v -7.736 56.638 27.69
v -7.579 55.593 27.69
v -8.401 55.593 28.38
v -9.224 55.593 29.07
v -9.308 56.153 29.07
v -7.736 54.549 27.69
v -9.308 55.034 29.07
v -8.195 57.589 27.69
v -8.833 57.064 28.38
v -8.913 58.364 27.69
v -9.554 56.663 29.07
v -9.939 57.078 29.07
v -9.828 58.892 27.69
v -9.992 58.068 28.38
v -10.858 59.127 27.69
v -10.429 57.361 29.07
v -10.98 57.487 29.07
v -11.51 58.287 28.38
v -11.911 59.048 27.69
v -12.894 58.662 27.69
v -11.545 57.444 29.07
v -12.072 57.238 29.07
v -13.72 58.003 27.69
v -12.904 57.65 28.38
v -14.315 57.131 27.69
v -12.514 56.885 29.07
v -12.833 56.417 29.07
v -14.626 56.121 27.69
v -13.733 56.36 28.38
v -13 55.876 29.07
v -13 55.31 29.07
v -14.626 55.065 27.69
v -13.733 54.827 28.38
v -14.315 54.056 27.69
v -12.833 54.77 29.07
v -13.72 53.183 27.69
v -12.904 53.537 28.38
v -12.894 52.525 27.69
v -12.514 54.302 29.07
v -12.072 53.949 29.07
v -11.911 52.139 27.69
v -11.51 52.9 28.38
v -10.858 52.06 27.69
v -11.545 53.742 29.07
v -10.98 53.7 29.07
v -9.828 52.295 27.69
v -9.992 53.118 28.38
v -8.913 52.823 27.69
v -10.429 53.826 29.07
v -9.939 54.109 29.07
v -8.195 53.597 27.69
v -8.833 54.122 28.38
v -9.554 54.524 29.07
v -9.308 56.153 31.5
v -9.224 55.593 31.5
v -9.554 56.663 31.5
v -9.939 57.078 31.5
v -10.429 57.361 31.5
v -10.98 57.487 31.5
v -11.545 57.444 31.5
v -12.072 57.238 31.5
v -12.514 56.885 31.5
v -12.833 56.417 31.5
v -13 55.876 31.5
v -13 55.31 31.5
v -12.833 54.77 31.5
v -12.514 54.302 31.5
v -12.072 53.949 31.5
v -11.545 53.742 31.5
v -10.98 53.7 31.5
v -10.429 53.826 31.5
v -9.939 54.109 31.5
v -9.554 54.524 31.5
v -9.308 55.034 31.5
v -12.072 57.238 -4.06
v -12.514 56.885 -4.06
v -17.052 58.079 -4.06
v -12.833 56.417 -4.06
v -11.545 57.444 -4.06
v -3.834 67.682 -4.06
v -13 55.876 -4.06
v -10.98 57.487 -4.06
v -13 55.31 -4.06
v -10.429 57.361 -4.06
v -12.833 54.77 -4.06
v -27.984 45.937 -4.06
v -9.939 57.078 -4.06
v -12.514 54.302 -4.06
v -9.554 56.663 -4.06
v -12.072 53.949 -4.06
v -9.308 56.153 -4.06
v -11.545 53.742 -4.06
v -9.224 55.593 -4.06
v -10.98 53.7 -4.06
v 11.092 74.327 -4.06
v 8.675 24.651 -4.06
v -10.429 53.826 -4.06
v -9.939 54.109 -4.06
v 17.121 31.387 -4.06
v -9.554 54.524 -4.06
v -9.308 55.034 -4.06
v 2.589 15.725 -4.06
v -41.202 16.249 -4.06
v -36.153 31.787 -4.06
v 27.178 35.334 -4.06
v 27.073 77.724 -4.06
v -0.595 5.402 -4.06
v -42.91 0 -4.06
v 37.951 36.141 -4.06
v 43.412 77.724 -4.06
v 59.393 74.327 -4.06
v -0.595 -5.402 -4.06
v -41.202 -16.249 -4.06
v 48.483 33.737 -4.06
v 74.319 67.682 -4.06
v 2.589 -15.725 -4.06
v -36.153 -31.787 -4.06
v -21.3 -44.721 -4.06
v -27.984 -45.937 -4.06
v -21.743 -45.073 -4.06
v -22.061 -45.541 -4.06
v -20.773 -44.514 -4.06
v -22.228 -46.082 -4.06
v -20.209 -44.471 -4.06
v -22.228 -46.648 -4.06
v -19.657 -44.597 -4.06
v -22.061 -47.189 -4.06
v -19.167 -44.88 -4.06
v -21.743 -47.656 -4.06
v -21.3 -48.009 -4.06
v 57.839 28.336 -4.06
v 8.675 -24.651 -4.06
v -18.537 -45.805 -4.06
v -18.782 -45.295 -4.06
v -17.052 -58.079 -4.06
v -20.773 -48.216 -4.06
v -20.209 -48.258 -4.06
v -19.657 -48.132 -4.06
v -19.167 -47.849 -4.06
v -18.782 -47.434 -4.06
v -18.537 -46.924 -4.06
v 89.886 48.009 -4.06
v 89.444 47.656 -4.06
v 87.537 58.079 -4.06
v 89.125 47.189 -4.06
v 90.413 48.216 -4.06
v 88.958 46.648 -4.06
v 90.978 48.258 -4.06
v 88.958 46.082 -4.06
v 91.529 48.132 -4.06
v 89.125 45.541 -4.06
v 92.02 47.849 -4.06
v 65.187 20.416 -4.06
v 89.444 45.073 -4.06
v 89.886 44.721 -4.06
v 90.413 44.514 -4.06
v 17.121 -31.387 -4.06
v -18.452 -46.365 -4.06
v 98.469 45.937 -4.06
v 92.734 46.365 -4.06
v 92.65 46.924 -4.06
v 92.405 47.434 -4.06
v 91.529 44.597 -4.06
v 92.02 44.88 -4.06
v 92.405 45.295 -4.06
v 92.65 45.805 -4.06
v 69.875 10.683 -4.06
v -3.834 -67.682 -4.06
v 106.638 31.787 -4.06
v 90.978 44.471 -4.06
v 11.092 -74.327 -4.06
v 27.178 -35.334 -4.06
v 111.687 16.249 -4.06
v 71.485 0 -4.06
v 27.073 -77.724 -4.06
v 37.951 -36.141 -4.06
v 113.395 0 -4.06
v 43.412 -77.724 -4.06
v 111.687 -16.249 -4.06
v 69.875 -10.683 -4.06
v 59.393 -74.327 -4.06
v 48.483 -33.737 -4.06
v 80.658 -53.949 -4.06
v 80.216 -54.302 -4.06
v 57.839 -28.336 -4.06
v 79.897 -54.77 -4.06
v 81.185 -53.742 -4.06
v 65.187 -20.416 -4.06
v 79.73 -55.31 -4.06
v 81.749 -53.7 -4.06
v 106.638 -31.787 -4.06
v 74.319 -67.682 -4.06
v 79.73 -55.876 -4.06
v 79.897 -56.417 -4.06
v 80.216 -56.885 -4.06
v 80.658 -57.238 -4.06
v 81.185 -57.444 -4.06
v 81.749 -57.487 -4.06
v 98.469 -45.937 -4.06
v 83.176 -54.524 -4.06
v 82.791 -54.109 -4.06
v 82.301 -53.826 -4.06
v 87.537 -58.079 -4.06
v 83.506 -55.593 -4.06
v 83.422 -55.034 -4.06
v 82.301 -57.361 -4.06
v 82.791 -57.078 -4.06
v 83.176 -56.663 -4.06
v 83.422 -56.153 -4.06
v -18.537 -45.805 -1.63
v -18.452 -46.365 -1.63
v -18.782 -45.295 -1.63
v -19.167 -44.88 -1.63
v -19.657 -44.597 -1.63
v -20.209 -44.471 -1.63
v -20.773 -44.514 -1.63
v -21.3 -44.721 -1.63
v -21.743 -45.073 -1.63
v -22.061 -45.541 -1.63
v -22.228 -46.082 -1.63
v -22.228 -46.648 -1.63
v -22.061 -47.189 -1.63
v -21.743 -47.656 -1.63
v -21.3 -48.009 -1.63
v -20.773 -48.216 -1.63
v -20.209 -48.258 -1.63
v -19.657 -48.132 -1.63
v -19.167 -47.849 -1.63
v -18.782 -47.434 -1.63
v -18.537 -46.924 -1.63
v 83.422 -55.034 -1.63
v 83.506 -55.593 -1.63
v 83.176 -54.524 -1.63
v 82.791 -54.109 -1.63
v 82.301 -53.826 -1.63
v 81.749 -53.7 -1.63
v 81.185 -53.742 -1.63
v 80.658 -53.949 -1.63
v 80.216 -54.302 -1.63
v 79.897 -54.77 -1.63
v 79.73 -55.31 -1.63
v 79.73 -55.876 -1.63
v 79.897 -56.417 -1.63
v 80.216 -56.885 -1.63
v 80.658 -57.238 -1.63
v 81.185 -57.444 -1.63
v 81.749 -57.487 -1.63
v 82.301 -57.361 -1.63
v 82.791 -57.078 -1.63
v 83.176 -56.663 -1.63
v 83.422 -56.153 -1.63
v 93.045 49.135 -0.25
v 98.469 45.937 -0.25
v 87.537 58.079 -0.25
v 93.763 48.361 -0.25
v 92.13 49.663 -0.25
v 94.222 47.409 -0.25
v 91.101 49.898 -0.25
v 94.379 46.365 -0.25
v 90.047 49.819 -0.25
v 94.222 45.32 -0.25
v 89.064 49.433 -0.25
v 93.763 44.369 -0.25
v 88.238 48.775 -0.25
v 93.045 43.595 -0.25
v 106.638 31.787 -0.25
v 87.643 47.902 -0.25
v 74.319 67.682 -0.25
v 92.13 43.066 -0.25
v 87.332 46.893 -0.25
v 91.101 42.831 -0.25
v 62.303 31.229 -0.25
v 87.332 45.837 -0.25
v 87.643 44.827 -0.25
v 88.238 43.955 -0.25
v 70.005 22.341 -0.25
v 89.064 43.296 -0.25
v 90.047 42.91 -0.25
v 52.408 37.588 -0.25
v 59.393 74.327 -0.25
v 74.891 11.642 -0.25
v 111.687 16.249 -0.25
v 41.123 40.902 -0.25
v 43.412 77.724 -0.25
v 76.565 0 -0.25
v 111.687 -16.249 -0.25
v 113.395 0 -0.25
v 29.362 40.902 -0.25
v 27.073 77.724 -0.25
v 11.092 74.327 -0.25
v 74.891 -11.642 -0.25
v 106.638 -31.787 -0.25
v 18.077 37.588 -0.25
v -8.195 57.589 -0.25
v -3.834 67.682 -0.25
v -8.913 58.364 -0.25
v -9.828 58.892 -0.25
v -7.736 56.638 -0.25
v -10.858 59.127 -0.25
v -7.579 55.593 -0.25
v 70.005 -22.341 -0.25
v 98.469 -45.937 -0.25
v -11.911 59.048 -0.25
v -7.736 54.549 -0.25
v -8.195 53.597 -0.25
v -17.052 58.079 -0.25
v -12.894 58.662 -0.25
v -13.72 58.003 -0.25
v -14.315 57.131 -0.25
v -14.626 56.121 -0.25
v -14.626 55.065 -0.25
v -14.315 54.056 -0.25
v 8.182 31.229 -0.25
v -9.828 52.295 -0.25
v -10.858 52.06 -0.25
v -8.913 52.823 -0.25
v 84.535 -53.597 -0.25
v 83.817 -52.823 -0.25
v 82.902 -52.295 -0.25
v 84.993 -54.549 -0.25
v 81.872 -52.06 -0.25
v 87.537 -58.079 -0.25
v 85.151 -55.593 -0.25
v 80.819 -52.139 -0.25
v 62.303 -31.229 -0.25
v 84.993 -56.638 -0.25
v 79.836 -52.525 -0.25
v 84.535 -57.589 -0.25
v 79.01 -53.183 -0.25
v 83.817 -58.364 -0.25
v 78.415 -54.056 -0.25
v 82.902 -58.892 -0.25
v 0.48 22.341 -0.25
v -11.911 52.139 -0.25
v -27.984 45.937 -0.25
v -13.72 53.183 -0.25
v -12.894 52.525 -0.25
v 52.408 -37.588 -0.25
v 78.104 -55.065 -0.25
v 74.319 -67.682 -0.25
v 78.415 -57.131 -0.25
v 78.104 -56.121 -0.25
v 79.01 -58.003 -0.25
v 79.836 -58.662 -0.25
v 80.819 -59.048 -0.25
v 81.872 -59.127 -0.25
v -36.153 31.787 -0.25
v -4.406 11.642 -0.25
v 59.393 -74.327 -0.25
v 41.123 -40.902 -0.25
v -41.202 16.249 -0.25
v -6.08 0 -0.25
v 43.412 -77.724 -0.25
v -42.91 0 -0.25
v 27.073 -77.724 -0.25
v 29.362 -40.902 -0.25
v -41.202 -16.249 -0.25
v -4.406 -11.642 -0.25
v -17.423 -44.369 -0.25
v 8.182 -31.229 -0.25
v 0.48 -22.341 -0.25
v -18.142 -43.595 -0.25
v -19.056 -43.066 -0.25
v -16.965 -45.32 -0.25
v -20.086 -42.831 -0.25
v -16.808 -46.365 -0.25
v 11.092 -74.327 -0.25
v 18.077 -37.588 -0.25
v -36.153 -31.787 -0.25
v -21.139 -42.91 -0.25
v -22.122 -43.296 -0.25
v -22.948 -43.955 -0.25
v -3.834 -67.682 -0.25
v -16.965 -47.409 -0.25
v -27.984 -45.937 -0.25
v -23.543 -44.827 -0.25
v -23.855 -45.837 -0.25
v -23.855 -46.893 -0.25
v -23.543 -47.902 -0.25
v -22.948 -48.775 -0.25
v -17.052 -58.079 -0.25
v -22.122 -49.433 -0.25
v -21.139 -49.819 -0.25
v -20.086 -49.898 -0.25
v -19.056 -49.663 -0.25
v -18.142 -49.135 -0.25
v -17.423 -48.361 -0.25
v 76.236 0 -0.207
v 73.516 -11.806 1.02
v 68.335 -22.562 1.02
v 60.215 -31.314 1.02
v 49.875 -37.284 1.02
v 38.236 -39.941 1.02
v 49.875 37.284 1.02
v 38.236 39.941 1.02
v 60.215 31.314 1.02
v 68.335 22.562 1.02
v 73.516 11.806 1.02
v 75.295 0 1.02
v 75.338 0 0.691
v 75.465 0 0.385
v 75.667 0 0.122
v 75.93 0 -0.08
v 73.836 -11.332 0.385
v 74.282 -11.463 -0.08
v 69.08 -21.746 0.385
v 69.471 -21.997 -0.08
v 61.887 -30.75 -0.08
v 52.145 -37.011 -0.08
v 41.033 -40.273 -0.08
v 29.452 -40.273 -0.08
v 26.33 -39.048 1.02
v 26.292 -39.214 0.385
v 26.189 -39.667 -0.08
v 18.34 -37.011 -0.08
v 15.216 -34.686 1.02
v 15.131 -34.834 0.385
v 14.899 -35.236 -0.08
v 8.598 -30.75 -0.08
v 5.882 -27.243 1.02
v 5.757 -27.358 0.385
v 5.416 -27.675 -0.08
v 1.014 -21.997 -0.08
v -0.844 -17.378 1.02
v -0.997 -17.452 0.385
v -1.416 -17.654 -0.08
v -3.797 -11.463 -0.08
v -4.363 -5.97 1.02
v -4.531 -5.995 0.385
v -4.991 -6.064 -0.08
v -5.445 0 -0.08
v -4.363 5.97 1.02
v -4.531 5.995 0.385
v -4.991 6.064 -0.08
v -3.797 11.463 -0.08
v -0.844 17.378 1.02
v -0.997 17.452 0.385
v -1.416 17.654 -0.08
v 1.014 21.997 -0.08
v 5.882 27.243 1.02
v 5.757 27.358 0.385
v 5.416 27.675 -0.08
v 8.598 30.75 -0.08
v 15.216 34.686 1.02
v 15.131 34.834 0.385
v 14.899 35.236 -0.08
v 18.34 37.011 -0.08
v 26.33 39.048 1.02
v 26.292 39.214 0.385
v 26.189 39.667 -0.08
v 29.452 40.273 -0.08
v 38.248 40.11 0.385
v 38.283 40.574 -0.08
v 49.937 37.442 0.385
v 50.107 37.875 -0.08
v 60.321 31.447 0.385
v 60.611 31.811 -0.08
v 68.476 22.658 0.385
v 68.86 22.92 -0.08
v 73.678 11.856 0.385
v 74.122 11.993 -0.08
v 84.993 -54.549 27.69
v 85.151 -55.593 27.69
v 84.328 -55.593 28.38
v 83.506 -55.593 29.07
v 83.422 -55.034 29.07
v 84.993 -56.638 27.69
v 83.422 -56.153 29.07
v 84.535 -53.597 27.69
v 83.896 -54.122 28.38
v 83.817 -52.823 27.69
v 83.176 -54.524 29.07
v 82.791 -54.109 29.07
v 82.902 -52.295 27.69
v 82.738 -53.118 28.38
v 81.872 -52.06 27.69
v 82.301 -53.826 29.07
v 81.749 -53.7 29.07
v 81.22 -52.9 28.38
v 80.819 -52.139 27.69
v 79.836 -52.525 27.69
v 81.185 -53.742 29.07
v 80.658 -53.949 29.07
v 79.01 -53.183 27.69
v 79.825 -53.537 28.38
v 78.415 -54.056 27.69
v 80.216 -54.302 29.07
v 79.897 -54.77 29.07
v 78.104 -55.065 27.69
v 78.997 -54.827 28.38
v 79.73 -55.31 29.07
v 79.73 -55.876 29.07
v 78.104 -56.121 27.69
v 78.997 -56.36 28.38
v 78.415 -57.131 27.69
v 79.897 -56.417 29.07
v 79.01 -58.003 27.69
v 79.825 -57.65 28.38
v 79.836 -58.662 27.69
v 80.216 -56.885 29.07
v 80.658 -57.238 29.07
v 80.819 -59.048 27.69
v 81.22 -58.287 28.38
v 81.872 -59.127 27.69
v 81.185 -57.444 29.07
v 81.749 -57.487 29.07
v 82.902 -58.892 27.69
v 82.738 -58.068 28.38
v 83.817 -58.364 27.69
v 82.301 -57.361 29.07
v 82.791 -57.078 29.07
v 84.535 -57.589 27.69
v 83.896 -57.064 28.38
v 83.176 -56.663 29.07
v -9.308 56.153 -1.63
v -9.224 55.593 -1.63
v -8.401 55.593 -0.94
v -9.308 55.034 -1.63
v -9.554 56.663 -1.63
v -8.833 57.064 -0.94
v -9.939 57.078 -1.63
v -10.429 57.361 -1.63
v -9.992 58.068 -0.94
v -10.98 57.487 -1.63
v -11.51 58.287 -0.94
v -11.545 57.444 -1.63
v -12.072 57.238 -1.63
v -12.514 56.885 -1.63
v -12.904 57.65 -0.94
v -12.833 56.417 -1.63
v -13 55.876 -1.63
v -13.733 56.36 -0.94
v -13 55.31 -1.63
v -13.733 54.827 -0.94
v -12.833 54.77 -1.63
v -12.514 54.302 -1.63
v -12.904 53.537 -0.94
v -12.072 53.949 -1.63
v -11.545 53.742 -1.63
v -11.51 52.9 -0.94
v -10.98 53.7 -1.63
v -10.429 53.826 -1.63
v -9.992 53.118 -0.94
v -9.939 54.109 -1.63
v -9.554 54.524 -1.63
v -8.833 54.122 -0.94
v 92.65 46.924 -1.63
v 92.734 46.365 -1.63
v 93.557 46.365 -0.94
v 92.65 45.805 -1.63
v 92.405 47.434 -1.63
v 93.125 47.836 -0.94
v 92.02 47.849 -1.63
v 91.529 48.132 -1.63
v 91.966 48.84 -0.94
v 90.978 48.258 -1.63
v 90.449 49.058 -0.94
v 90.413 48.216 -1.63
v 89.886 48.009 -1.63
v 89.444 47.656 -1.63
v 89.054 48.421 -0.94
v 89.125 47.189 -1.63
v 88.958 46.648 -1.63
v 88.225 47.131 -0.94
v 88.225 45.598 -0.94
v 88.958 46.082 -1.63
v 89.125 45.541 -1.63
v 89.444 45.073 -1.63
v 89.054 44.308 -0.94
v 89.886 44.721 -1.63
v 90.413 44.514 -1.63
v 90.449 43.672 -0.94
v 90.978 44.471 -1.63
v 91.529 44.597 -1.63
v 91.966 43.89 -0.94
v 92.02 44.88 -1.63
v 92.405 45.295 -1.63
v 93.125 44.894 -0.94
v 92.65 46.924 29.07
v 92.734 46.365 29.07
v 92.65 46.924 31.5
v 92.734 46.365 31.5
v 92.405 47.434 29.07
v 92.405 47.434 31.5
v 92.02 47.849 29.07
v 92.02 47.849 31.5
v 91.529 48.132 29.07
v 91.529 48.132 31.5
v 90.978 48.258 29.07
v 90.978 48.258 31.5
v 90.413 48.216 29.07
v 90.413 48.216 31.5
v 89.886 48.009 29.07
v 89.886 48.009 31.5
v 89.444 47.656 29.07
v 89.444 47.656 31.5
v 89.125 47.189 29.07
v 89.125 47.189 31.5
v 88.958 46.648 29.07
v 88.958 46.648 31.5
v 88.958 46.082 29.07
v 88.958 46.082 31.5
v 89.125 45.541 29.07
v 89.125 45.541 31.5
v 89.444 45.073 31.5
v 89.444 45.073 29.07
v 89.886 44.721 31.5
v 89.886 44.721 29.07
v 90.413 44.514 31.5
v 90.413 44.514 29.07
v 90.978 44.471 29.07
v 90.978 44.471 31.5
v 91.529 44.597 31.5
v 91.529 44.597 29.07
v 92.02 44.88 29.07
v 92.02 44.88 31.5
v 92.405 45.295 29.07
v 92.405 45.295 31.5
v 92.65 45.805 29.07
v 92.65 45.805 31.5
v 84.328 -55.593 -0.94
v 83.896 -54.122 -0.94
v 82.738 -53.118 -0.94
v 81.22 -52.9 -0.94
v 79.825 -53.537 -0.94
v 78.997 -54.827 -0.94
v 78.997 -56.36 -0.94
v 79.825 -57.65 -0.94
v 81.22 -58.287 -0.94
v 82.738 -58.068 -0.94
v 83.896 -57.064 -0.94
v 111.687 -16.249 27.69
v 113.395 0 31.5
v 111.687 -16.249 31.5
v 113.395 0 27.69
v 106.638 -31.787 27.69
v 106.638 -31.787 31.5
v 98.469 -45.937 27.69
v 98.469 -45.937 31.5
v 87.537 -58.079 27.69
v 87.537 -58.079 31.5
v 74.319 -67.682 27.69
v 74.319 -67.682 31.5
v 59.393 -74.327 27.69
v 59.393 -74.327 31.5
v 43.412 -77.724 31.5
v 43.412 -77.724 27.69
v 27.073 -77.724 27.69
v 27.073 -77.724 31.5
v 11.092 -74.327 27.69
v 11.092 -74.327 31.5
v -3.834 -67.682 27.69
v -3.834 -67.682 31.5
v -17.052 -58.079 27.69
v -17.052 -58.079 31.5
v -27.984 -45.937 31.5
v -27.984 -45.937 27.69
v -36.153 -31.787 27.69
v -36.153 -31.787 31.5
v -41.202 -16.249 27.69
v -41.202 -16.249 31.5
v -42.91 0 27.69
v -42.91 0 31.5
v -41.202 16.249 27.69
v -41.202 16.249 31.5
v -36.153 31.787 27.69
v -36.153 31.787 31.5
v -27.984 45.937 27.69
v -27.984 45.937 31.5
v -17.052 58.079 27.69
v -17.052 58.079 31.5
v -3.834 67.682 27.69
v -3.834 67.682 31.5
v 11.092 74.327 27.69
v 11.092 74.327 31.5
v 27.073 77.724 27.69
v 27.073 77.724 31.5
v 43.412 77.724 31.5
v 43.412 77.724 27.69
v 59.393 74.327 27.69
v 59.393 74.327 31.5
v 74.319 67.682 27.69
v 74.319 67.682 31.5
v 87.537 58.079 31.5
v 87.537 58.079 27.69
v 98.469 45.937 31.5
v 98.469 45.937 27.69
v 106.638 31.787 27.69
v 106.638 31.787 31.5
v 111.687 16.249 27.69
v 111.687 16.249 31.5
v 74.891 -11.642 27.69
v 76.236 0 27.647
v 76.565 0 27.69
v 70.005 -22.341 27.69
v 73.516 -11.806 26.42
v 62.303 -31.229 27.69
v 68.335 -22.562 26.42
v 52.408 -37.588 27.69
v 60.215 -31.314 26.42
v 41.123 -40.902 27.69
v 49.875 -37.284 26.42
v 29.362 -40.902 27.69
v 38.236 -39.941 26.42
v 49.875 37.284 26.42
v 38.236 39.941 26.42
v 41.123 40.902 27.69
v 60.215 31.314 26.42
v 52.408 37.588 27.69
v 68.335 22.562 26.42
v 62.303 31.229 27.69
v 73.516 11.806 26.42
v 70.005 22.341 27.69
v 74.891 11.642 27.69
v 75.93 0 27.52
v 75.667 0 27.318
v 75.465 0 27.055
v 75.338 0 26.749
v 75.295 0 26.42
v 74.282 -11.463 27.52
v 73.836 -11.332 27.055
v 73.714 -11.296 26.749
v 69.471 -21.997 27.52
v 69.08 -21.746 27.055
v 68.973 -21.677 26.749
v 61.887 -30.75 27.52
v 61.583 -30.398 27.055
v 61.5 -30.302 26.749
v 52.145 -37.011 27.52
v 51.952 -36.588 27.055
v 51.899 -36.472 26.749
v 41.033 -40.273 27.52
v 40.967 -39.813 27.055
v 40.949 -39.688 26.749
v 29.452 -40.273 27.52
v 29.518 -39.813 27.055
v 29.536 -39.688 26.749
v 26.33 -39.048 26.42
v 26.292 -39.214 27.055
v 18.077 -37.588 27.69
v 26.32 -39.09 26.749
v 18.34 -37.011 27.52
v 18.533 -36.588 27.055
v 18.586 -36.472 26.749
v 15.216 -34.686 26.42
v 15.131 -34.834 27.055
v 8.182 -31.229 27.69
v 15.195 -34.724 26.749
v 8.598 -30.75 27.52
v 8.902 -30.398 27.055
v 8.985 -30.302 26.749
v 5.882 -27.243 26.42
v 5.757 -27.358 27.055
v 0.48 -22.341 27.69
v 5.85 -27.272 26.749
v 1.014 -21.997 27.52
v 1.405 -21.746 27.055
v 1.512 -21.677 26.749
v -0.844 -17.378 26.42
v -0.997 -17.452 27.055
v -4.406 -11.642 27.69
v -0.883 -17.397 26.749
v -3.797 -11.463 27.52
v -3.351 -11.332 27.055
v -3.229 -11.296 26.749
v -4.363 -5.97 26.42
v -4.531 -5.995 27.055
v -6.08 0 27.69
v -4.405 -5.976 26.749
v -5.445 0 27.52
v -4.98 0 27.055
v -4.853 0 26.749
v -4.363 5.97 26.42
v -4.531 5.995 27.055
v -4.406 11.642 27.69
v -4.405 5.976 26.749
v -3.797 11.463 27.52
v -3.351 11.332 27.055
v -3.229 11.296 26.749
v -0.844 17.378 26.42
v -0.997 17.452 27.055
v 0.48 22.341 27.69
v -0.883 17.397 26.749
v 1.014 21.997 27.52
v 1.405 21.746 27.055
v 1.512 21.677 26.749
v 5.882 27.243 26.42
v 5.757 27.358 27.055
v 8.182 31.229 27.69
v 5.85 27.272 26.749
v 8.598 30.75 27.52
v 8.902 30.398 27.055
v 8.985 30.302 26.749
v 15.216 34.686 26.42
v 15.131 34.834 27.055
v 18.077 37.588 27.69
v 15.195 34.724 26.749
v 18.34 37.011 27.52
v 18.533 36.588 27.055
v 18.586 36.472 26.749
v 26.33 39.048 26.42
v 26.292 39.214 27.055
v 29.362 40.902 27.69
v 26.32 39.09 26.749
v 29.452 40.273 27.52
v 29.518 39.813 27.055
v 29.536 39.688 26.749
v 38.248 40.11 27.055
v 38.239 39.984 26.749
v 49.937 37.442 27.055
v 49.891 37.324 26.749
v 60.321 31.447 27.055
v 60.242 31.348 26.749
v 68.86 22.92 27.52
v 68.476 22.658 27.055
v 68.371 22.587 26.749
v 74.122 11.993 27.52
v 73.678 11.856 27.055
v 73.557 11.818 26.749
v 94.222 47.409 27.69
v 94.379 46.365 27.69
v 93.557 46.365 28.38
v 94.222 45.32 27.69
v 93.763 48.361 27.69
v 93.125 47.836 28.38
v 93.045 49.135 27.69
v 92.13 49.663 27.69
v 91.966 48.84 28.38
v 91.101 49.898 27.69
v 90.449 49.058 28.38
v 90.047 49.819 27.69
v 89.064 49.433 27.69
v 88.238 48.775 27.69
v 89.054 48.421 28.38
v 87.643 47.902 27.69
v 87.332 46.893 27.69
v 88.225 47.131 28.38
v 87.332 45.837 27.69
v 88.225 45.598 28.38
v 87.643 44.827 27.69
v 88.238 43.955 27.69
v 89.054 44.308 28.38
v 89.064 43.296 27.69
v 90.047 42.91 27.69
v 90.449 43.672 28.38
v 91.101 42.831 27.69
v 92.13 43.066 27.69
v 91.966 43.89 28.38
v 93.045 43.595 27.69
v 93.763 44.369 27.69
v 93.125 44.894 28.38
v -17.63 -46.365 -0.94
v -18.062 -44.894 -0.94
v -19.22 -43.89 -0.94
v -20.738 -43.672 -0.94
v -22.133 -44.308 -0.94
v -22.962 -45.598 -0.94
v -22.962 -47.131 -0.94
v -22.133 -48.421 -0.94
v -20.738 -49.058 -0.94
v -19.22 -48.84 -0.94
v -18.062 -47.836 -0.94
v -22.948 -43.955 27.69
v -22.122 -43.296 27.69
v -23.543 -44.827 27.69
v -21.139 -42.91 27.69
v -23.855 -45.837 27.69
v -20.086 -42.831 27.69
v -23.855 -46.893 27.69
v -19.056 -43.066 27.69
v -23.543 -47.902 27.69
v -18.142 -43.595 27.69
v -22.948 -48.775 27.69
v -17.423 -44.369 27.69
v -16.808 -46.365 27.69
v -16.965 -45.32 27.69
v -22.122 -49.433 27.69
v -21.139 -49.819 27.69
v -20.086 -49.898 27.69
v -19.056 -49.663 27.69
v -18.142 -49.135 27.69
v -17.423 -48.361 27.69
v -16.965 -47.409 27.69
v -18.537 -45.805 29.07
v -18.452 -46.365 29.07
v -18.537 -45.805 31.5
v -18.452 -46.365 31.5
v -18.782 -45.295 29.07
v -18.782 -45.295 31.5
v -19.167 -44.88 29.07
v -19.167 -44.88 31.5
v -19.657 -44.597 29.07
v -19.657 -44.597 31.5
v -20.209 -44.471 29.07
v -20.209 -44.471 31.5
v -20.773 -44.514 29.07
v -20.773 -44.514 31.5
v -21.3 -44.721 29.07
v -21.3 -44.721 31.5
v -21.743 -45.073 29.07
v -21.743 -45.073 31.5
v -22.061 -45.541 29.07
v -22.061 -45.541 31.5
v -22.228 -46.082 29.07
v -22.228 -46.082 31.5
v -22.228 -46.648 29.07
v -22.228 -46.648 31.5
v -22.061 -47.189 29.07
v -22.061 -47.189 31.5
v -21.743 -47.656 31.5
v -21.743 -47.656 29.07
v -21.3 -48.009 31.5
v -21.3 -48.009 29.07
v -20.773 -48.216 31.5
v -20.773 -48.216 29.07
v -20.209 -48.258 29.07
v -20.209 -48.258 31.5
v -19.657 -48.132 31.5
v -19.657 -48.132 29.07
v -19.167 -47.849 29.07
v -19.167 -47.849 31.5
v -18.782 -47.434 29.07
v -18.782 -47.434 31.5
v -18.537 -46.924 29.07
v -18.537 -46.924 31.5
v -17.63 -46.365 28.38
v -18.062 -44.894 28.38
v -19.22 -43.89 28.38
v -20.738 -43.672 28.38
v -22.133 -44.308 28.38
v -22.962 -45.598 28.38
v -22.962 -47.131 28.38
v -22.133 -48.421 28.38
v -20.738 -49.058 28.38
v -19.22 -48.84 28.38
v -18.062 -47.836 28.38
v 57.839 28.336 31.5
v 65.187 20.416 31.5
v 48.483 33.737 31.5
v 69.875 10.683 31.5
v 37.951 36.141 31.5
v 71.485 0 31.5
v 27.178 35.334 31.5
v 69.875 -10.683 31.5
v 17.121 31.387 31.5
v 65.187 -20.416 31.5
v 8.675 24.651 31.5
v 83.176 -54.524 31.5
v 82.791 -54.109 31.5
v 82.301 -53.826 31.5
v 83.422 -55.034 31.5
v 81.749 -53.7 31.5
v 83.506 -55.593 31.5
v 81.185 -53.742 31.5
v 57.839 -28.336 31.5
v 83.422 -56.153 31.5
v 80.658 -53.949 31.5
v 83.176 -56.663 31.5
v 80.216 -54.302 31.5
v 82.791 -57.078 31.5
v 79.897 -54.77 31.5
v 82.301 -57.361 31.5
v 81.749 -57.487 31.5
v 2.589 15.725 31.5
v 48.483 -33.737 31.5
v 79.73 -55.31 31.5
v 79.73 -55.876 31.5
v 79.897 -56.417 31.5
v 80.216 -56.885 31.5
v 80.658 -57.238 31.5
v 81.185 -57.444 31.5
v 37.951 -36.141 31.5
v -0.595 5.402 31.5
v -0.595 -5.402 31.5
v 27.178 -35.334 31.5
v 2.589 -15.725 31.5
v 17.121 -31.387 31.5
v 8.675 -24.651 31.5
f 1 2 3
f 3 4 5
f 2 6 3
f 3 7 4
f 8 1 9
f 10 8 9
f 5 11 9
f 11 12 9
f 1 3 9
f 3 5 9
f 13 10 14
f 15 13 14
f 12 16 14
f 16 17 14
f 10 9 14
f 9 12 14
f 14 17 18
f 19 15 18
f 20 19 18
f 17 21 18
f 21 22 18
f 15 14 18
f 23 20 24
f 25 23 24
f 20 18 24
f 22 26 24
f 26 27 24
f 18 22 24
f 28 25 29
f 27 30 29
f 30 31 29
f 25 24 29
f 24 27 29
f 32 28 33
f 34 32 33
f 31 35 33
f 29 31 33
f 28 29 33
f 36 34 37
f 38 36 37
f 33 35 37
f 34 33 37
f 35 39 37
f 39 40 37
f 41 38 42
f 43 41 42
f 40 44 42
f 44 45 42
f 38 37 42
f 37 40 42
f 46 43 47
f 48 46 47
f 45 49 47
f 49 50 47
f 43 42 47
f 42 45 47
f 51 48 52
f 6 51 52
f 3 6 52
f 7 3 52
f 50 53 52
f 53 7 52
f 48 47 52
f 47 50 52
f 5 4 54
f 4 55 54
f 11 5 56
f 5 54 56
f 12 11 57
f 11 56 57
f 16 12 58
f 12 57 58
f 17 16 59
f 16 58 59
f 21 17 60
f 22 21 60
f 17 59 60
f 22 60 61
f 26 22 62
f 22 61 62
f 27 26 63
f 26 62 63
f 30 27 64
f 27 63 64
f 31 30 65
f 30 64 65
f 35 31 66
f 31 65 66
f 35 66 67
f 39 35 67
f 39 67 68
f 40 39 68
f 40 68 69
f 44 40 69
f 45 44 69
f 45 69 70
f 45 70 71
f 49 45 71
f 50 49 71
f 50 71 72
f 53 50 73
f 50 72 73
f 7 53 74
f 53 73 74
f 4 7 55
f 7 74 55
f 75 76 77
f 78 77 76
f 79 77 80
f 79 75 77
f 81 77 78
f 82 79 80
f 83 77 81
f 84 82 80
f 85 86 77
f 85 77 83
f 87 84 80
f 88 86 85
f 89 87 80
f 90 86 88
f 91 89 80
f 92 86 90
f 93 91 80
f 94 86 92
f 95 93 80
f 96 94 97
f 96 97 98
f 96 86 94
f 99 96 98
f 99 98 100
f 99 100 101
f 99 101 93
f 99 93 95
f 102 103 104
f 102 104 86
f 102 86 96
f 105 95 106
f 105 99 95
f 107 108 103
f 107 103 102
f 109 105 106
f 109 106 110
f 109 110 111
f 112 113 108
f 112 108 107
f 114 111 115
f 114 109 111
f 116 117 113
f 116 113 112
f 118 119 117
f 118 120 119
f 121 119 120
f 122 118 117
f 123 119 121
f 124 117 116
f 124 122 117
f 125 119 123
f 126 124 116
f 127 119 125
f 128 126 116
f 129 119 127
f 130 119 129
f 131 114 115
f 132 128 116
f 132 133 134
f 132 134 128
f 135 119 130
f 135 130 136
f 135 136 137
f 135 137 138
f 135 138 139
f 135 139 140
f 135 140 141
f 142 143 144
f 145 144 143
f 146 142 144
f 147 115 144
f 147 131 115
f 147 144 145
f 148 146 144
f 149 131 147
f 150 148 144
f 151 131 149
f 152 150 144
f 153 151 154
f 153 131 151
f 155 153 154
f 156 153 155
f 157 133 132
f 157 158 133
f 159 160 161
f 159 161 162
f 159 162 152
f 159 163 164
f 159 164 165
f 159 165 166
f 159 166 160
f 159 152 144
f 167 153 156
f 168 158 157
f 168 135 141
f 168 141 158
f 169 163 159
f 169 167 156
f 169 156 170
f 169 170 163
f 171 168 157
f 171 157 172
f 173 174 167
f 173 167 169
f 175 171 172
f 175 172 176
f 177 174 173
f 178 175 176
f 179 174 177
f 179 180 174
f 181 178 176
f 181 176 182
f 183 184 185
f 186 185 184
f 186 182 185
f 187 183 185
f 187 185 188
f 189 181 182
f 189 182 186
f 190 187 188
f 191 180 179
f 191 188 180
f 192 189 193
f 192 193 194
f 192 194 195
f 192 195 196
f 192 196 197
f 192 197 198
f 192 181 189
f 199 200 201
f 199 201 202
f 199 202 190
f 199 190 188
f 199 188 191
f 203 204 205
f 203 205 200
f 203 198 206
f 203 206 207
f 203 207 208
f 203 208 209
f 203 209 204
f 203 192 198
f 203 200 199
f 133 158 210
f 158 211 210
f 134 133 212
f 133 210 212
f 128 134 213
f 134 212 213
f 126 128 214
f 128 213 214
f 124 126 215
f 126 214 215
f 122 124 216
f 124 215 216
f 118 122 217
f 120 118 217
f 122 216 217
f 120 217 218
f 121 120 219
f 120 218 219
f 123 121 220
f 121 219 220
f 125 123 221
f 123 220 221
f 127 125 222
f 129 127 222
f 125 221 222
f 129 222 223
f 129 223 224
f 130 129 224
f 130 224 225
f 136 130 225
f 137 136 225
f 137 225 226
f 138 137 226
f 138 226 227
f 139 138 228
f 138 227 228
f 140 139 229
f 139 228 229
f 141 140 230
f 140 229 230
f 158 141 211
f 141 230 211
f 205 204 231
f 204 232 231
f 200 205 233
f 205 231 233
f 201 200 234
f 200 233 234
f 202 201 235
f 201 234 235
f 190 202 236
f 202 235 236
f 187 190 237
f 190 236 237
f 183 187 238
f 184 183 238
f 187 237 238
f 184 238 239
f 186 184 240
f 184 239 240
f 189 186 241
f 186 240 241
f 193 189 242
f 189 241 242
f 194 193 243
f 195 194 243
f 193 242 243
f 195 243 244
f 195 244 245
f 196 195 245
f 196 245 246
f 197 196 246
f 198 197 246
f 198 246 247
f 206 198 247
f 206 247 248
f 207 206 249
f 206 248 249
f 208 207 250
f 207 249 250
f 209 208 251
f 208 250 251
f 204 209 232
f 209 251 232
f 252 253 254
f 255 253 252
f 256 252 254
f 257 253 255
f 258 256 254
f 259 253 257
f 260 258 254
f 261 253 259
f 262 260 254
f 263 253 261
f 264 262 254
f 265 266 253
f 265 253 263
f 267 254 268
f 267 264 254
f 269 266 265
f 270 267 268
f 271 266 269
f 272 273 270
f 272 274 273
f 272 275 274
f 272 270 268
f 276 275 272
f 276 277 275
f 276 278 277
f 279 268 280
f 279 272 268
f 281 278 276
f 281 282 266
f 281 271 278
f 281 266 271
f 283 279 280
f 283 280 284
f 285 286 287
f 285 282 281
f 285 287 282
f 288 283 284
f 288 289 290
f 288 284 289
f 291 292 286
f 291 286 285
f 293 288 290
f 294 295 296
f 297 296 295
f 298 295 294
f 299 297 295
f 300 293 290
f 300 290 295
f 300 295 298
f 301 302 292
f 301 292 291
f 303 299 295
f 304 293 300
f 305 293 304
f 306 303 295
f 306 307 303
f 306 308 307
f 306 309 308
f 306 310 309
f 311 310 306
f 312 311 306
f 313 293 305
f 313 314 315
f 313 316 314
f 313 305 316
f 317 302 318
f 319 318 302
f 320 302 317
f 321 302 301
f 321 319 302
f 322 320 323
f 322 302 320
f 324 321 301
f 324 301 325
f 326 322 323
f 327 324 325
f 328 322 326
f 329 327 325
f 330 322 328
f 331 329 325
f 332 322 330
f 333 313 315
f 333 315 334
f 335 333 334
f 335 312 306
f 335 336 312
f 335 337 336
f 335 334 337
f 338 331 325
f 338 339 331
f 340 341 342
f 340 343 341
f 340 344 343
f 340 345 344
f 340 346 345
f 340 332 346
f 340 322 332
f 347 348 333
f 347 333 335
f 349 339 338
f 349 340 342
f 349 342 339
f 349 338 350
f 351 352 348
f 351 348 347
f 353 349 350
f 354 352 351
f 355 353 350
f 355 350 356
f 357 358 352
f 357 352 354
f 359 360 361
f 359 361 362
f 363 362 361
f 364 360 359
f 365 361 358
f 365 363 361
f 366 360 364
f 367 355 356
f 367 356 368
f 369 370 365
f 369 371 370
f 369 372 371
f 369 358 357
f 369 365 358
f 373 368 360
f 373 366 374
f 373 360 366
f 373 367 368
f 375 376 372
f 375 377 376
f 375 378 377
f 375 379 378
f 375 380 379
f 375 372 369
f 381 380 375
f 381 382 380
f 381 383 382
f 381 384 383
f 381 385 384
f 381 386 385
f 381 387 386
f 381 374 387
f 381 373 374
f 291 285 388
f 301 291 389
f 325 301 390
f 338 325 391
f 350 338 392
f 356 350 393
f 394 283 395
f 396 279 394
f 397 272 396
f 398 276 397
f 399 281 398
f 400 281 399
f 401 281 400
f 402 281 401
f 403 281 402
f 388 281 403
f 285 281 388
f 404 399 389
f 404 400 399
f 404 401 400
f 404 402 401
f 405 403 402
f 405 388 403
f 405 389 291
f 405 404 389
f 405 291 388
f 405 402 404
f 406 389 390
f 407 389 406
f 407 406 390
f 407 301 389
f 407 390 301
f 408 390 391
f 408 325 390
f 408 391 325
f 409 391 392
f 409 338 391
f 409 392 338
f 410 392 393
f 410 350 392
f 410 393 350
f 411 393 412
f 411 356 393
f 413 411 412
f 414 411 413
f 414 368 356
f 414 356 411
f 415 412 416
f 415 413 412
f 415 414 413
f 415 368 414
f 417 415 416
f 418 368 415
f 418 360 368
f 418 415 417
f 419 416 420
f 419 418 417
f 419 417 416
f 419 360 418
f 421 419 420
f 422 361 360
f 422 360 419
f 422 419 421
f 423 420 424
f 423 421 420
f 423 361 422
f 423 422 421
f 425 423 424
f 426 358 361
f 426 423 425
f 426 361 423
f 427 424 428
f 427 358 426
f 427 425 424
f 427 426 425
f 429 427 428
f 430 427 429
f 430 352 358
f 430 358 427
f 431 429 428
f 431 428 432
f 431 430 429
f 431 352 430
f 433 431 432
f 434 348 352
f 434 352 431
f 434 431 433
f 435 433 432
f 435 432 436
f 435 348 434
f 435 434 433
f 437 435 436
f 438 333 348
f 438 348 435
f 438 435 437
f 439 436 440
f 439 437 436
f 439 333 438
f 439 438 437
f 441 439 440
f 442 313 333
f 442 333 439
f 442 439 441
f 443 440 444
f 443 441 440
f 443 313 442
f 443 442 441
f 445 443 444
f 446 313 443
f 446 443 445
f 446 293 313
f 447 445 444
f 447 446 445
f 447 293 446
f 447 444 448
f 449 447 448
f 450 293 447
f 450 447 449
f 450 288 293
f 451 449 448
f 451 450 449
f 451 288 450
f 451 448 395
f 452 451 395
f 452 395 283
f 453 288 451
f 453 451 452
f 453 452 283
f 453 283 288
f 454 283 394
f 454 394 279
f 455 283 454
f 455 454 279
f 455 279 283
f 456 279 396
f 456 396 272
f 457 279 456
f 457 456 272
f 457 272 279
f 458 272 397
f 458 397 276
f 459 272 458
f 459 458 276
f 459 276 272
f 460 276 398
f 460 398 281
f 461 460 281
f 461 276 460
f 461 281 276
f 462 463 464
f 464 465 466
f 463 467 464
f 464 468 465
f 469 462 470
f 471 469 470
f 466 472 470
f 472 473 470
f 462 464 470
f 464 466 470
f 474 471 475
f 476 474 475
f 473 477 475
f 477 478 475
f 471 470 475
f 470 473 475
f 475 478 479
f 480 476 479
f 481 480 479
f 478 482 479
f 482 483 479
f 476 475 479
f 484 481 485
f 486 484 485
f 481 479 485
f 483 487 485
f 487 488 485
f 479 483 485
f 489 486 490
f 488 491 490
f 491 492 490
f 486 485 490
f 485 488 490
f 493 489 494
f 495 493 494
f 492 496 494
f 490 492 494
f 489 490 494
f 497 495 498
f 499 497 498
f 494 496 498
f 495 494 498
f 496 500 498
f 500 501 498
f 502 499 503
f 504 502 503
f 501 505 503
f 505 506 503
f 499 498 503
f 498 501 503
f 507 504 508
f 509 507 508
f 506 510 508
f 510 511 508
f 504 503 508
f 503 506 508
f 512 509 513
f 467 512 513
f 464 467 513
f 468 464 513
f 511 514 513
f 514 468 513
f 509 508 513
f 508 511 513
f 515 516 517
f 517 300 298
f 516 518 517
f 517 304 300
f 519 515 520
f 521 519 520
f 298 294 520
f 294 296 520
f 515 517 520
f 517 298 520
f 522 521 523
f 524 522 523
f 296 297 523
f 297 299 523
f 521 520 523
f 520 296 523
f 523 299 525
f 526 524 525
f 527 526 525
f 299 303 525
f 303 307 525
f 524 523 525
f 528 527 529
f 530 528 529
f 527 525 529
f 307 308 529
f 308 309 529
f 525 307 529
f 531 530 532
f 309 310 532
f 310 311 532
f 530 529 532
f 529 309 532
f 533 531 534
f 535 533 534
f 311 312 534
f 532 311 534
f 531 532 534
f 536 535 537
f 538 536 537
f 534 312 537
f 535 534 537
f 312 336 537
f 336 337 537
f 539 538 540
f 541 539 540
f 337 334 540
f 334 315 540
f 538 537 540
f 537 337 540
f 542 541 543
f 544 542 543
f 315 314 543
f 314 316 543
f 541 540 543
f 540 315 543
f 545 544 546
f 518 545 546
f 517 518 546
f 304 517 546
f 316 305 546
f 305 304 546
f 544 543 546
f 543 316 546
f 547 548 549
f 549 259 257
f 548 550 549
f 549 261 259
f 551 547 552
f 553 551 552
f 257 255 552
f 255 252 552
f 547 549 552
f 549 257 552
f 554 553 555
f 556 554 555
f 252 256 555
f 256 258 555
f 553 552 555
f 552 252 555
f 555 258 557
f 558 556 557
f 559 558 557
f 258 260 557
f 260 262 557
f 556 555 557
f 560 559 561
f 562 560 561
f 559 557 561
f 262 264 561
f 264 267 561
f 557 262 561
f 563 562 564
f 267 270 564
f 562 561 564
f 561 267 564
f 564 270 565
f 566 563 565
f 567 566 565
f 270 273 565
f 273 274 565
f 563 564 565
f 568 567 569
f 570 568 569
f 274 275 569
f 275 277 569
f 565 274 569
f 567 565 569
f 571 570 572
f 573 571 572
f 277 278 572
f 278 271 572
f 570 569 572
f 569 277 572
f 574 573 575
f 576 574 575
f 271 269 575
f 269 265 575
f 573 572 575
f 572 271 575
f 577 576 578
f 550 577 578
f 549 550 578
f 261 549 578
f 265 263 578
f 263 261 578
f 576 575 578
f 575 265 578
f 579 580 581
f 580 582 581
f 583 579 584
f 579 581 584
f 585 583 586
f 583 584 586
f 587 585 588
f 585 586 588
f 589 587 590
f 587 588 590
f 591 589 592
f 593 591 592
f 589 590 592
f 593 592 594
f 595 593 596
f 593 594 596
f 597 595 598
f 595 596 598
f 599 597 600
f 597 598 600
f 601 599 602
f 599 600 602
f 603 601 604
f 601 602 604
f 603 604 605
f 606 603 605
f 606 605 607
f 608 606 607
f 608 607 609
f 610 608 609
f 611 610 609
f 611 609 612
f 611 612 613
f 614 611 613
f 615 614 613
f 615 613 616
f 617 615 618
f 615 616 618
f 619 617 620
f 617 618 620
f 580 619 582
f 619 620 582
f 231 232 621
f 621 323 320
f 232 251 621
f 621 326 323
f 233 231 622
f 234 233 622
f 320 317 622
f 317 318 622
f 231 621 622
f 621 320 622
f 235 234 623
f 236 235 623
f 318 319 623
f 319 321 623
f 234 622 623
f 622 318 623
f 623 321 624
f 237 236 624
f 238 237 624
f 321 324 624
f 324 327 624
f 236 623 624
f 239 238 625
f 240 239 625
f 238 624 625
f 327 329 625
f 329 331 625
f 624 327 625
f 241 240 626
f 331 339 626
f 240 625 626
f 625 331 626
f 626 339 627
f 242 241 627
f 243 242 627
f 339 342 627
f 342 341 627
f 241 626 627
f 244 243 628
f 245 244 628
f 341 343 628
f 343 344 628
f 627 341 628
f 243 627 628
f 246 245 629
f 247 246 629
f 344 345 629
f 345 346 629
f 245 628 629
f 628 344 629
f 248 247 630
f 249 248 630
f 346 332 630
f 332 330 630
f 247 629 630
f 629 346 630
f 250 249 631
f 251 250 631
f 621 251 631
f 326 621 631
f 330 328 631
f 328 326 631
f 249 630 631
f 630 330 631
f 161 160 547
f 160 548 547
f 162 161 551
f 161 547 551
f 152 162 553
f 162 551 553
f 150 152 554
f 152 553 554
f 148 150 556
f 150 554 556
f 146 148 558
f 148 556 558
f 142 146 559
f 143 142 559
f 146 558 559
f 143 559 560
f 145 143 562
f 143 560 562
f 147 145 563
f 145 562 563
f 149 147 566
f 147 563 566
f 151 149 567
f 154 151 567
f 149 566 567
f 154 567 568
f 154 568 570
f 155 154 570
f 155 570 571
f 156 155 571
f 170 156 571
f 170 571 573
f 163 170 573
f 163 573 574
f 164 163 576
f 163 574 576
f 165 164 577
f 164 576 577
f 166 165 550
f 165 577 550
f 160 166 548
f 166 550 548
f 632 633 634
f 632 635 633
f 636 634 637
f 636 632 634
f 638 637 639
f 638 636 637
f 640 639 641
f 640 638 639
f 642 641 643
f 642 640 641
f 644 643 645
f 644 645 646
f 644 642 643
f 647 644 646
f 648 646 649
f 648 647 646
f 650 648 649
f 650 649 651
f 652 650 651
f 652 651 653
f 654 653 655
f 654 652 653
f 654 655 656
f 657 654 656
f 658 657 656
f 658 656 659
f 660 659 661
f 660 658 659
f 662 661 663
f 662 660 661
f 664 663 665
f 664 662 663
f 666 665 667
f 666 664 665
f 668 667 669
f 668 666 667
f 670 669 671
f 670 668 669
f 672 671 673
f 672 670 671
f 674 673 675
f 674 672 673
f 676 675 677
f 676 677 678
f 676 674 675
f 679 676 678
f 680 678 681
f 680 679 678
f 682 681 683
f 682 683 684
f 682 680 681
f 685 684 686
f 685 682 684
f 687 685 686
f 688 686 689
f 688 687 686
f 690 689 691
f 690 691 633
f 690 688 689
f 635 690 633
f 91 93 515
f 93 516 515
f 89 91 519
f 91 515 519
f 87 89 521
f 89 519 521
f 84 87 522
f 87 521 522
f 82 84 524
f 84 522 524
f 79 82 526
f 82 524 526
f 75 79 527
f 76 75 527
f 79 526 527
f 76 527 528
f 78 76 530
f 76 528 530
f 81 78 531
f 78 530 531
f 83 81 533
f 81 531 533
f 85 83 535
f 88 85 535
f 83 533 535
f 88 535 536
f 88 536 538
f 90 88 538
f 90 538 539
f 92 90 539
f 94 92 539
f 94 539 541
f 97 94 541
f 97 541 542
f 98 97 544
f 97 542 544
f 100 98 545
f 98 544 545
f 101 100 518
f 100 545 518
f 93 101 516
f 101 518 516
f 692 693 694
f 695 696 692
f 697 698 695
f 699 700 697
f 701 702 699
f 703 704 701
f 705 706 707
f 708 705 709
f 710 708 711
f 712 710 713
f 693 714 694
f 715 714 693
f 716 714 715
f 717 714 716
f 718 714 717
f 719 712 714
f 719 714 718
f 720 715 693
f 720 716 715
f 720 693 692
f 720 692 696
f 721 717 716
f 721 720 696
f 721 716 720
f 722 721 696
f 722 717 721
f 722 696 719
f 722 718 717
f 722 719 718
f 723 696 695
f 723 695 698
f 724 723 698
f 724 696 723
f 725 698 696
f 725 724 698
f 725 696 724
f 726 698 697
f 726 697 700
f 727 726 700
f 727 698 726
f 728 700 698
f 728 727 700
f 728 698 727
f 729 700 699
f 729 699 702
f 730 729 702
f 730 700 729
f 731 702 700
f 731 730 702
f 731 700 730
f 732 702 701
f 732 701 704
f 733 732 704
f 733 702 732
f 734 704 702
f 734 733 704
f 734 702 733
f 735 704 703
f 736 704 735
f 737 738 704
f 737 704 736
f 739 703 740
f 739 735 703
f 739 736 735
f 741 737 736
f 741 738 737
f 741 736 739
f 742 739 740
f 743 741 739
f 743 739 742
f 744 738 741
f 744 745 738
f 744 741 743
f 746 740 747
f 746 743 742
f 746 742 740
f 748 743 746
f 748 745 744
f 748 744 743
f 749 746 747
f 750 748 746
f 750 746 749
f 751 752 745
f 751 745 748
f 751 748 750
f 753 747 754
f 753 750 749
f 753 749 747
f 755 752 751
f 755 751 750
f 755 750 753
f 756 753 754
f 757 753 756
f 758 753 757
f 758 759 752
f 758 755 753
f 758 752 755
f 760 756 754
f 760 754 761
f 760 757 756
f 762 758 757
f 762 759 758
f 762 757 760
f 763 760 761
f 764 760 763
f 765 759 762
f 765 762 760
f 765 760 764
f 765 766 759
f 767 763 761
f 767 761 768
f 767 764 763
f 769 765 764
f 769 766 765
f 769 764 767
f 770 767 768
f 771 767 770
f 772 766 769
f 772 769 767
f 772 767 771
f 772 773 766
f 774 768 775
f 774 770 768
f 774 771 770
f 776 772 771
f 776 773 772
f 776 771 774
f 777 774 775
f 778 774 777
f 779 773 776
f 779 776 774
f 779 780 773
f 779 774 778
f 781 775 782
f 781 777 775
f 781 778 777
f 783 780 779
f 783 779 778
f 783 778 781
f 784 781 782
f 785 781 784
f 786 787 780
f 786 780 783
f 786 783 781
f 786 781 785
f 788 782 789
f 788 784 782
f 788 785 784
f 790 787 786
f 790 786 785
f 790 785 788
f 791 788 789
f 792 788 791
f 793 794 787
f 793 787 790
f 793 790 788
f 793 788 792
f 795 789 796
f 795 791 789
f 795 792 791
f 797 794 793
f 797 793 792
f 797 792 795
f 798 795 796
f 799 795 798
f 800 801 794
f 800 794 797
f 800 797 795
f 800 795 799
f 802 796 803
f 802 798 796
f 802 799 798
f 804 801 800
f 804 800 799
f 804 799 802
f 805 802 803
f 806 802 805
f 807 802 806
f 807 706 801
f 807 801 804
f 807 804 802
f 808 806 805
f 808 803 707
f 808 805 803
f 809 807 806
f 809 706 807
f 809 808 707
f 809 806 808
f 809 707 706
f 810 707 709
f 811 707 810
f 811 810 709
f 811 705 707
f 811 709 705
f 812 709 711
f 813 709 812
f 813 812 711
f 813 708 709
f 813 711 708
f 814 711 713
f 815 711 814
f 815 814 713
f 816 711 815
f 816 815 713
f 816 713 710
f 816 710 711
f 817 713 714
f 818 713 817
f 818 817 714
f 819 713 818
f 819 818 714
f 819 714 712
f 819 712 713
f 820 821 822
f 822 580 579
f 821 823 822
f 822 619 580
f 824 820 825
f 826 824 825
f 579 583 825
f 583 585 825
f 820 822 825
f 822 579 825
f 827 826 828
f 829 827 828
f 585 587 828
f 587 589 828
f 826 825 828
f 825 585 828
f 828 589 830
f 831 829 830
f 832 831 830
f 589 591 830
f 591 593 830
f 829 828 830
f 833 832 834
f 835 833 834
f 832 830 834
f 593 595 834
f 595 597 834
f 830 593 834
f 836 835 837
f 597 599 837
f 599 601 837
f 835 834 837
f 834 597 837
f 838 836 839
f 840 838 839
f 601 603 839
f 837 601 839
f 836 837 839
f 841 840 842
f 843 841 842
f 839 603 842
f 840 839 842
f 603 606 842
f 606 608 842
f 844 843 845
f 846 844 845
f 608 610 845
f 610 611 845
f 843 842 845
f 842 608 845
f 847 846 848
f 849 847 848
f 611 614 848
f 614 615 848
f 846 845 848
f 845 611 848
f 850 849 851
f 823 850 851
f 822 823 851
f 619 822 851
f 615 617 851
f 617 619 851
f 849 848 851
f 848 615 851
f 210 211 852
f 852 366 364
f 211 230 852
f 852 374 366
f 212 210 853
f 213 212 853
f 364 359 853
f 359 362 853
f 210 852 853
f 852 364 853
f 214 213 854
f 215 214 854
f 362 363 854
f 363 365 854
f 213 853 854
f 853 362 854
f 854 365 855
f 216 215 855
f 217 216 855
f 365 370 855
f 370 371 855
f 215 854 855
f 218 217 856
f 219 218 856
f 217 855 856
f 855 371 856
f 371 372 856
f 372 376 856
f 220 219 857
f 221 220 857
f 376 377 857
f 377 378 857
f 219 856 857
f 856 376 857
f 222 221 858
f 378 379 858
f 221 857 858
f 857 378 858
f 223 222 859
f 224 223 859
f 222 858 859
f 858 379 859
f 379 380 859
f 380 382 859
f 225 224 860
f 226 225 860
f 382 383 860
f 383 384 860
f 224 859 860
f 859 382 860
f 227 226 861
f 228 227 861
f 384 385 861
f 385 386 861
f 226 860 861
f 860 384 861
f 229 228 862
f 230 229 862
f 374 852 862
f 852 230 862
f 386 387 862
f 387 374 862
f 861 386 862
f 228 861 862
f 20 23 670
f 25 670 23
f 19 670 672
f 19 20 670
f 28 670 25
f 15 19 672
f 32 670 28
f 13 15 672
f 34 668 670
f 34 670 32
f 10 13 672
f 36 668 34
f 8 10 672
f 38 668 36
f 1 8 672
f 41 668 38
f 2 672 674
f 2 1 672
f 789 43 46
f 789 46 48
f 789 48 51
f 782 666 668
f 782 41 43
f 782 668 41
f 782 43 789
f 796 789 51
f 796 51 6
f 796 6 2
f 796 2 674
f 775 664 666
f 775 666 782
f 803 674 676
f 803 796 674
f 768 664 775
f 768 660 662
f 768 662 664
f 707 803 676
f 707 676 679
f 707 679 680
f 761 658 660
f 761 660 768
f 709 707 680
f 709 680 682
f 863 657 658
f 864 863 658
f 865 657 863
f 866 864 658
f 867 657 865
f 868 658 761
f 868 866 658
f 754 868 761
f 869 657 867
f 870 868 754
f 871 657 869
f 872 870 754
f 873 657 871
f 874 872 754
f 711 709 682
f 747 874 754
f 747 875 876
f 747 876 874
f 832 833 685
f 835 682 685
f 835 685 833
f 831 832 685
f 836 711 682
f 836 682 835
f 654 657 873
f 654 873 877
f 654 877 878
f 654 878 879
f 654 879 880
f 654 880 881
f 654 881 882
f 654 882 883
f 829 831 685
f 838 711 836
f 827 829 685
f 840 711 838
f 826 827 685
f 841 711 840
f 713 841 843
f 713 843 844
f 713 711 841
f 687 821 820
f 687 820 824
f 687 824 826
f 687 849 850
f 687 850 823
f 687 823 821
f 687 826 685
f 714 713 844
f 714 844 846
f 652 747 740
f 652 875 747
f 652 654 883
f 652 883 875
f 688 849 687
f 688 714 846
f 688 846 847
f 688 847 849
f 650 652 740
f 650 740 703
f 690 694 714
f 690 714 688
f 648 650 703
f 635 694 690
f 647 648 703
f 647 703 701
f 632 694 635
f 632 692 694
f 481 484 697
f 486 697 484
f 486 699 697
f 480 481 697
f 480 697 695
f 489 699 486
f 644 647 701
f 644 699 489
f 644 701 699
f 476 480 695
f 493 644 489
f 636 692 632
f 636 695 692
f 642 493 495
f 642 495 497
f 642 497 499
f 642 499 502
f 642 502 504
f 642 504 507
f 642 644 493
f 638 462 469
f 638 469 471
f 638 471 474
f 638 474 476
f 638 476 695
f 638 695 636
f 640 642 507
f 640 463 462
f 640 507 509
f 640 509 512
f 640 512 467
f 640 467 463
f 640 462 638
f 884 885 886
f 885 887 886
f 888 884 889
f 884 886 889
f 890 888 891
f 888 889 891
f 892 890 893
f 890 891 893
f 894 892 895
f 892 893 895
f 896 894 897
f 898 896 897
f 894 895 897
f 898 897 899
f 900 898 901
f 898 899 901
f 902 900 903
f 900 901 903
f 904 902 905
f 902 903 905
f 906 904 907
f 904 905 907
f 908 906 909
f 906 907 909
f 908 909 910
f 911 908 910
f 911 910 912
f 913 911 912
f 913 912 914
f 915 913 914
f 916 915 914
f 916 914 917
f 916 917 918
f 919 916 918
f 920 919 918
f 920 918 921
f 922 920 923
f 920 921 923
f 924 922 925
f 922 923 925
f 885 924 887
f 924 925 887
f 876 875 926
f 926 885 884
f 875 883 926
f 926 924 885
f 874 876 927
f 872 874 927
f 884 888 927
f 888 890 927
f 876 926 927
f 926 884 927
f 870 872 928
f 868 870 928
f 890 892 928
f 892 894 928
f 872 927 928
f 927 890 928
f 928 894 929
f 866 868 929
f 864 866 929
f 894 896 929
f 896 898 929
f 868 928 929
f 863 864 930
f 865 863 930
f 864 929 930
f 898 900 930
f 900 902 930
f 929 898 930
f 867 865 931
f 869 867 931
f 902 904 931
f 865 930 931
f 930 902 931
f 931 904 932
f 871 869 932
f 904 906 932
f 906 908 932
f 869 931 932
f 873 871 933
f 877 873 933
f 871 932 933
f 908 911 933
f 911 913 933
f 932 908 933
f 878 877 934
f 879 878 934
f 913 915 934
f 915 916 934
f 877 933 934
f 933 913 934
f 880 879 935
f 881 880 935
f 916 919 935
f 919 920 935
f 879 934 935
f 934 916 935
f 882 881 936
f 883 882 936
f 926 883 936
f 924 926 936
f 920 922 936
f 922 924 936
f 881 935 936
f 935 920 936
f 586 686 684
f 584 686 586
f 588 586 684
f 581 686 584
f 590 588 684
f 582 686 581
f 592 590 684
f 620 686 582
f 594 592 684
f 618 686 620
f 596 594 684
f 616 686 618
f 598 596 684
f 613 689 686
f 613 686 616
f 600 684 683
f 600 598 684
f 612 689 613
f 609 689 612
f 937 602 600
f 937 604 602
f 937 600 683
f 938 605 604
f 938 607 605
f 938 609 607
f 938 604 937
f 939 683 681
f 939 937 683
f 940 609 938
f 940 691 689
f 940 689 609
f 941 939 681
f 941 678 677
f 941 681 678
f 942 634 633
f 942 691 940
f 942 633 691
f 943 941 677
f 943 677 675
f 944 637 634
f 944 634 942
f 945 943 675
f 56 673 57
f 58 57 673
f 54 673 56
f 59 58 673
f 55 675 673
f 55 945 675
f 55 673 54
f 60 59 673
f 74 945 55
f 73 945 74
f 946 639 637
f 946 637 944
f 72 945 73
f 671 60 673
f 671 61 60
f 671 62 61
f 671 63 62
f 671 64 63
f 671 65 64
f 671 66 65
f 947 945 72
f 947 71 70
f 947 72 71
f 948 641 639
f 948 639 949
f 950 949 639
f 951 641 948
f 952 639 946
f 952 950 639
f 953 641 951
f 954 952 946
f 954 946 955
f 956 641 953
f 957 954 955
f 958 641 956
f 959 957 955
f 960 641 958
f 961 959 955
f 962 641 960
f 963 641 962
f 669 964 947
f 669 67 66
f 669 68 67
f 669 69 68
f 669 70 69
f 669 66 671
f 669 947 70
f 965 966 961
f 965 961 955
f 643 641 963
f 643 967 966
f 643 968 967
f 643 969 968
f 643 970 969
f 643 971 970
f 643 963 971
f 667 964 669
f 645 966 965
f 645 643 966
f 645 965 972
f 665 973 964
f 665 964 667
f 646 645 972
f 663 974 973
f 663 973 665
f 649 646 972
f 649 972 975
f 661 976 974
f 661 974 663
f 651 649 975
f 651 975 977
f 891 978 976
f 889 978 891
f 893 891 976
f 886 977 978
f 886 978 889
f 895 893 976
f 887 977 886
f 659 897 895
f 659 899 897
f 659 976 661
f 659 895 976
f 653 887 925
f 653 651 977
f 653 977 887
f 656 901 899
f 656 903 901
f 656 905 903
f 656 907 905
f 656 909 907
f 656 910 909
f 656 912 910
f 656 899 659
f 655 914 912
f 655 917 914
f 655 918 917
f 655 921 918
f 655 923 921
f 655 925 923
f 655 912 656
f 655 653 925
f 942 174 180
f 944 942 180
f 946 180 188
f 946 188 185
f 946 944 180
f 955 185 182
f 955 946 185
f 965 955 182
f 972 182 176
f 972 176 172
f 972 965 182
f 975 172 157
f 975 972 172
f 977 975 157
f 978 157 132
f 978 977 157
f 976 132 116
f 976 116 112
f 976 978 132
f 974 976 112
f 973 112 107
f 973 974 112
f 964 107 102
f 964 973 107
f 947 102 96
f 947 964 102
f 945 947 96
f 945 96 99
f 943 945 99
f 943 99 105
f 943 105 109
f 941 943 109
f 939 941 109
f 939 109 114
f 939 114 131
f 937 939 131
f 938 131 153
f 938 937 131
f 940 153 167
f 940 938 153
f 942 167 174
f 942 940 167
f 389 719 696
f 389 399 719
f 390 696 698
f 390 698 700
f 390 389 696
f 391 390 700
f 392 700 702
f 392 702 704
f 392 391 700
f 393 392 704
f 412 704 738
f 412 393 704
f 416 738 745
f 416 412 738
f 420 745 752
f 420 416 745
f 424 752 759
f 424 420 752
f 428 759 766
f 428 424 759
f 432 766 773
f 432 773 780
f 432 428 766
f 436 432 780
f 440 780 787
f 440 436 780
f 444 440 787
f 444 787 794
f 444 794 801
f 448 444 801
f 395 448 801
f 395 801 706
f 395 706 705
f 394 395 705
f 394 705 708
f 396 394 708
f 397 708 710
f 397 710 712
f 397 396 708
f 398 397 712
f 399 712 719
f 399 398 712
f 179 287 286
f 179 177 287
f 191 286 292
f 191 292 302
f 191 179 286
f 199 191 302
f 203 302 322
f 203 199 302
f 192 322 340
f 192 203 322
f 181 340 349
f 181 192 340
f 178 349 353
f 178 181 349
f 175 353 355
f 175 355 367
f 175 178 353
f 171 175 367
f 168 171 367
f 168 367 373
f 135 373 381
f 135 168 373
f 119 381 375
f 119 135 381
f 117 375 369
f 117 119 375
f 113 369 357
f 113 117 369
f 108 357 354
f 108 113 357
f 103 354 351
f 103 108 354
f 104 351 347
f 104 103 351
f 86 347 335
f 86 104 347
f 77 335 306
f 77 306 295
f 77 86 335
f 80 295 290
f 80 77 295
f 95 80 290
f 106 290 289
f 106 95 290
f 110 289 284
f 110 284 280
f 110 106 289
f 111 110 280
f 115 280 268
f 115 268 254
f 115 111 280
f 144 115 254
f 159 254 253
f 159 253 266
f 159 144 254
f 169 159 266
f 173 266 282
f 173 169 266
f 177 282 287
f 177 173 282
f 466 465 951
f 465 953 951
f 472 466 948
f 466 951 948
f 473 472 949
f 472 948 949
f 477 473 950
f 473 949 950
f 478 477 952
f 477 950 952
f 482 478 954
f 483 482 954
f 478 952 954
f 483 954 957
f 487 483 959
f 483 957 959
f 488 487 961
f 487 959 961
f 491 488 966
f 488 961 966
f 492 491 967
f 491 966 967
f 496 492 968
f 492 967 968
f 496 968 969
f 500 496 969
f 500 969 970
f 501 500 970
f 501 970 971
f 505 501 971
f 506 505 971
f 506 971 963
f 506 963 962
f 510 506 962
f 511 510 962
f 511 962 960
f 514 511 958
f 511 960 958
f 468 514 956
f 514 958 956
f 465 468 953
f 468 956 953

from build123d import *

# Parameters (mm, degrees)
SKETCH2_R          = 1.8288
CUT_EXTRUDE1_DEPTH = 143.234851149
CIRPATTERN1_COUNT  = 4


# Read off the part's stored shape, not the designer's step: CSK for #6 Flat Head Machine Screw (100)1
with BuildPart() as part:
    # Sketch1 → Revolve8 (revolve)
    with BuildSketch(Plane(origin=(0, 0, 0), x_dir=(1, 0, 0), z_dir=(0, 1, 0)), mode=Mode.PRIVATE) as revolve8_sk:
        with BuildLine():
            Line((-42.91, 4.059999872), (-1, 4.059999872))
            Line((-1, 4.059999872), (-1, -31.500000128))
            Line((-1, -31.500000128), (-42.91, -31.500000128))
            Line((-42.91, -31.500000128), (-42.91, -27.690000128))
            Line((-42.91, -27.690000128), (-6.08, -27.690000128))
            ThreePointArc((-6.08, -27.690000128), (-5.181974388, -27.31802574), (-4.81, -26.420000128))
            Line((-4.81, -26.420000128), (-4.81, -1.020000128))
            ThreePointArc((-4.81, -1.020000128), (-5.181974388, -0.121974516), (-6.08, 0.249999872))
            Line((-6.08, 0.249999872), (-42.91, 0.249999872))
            Line((-42.91, 0.249999872), (-42.91, 4.059999872))
        make_face()
    revolve(revolve8_sk.sketch.rotate(Axis((35.2425, 0, 32.45), (0, 0, -1)), 180), axis=Axis((35.2425, 0, 32.45), (0, 0, -1)))

    # Sketch2 → Cut-Extrude1 (cut, through all)
    with BuildSketch(Plane(origin=(0, 0, -4.059999872), x_dir=(-1, 0, 0), z_dir=(0, 0, -1))):
        with Locations((11.122317884, 55.593306815)):
            Circle(SKETCH2_R)
    cut_extrude1 = extrude(amount=-CUT_EXTRUDE1_DEPTH, mode=Mode.SUBTRACT)

    # CirPattern1: Cut-Extrude1 ×4 about axis
    cirpattern1_axis = Axis((35.2425, 0, 0), (0, 0, 1))
    for i in range(1, CIRPATTERN1_COUNT):
        add(cut_extrude1.rotate(cirpattern1_axis, i * 360 / CIRPATTERN1_COUNT), mode=Mode.SUBTRACT)

    # CSK for _6 Flat Head Machine Screw _ 2 → CSK for #6 Flat Head Machine Screw (100)1 (revolve, cut)
    with BuildSketch(Plane(origin=(-11.122317884, 55.593306815, 0), x_dir=(1, 0, 0), z_dir=(0, -1, 0))):
        Polygon((1.89865, 29.070025336), (1.89865, 31.500000128), (1.8288, 31.500000128), (1.8288, 27.690000128), (3.5433, 27.690000128), align=None)
        Polygon((1.89865, -1.63002508), (3.5433, -0.249999872), (1.8288, -0.249999872), (1.8288, -4.059999872), (1.89865, -4.059999872), align=None)
    revolve(axis=Axis((-11.122317884, 55.593306815, 0), (0, 0, 1)), mode=Mode.SUBTRACT)

    # CSK for _6 Flat Head Machine Screw _ 3 o → CSK for _6 Flat Head Machine Screw _ 3 (revolve, cut)
    with BuildSketch(Plane(origin=(-20.350806815, -46.364817884, 0), x_dir=(1, 0, 0), z_dir=(0, -1, 0))):
        Polygon((1.89865, 29.070025336), (1.89865, 31.500000128), (1.8288, 31.500000128), (1.8288, 27.690000128), (3.5433, 27.690000128), align=None)
        Polygon((1.89865, -1.63002508), (3.5433, -0.249999872), (1.8288, -0.249999872), (1.8288, -4.059999872), (1.89865, -4.059999872), align=None)
    revolve(axis=Axis((-20.350806815, -46.364817884, 0), (0, 0, 1)), mode=Mode.SUBTRACT)

    # CSK for _6 Flat Head Machine Screw _ 4 o → CSK for _6 Flat Head Machine Screw _ 4 (revolve, cut)
    with BuildSketch(Plane(origin=(81.607317884, -55.593306815, 0), x_dir=(1, 0, 0), z_dir=(0, -1, 0))):
        Polygon((1.89865, 29.070025336), (1.89865, 31.500000128), (1.8288, 31.500000128), (1.8288, 27.690000128), (3.5433, 27.690000128), align=None)
        Polygon((1.89865, -1.63002508), (3.5433, -0.249999872), (1.8288, -0.249999872), (1.8288, -4.059999872), (1.89865, -4.059999872), align=None)
    revolve(axis=Axis((81.607317884, -55.593306815, 0), (0, 0, 1)), mode=Mode.SUBTRACT)

    # CSK for _6 Flat Head Machine Screw _ 5 o → CSK for _6 Flat Head Machine Screw _ 5 (revolve, cut)
    with BuildSketch(Plane(origin=(90.835806815, 46.364817884, 0), x_dir=(1, 0, 0), z_dir=(0, -1, 0))):
        Polygon((1.89865, 29.070025336), (1.89865, 31.500000128), (1.8288, 31.500000128), (1.8288, 27.690000128), (3.5433, 27.690000128), align=None)
        Polygon((1.89865, -1.63002508), (3.5433, -0.249999872), (1.8288, -0.249999872), (1.8288, -4.059999872), (1.89865, -4.059999872), align=None)
    revolve(axis=Axis((90.835806815, 46.364817884, 0), (0, 0, 1)), mode=Mode.SUBTRACT)


solid = part.part
